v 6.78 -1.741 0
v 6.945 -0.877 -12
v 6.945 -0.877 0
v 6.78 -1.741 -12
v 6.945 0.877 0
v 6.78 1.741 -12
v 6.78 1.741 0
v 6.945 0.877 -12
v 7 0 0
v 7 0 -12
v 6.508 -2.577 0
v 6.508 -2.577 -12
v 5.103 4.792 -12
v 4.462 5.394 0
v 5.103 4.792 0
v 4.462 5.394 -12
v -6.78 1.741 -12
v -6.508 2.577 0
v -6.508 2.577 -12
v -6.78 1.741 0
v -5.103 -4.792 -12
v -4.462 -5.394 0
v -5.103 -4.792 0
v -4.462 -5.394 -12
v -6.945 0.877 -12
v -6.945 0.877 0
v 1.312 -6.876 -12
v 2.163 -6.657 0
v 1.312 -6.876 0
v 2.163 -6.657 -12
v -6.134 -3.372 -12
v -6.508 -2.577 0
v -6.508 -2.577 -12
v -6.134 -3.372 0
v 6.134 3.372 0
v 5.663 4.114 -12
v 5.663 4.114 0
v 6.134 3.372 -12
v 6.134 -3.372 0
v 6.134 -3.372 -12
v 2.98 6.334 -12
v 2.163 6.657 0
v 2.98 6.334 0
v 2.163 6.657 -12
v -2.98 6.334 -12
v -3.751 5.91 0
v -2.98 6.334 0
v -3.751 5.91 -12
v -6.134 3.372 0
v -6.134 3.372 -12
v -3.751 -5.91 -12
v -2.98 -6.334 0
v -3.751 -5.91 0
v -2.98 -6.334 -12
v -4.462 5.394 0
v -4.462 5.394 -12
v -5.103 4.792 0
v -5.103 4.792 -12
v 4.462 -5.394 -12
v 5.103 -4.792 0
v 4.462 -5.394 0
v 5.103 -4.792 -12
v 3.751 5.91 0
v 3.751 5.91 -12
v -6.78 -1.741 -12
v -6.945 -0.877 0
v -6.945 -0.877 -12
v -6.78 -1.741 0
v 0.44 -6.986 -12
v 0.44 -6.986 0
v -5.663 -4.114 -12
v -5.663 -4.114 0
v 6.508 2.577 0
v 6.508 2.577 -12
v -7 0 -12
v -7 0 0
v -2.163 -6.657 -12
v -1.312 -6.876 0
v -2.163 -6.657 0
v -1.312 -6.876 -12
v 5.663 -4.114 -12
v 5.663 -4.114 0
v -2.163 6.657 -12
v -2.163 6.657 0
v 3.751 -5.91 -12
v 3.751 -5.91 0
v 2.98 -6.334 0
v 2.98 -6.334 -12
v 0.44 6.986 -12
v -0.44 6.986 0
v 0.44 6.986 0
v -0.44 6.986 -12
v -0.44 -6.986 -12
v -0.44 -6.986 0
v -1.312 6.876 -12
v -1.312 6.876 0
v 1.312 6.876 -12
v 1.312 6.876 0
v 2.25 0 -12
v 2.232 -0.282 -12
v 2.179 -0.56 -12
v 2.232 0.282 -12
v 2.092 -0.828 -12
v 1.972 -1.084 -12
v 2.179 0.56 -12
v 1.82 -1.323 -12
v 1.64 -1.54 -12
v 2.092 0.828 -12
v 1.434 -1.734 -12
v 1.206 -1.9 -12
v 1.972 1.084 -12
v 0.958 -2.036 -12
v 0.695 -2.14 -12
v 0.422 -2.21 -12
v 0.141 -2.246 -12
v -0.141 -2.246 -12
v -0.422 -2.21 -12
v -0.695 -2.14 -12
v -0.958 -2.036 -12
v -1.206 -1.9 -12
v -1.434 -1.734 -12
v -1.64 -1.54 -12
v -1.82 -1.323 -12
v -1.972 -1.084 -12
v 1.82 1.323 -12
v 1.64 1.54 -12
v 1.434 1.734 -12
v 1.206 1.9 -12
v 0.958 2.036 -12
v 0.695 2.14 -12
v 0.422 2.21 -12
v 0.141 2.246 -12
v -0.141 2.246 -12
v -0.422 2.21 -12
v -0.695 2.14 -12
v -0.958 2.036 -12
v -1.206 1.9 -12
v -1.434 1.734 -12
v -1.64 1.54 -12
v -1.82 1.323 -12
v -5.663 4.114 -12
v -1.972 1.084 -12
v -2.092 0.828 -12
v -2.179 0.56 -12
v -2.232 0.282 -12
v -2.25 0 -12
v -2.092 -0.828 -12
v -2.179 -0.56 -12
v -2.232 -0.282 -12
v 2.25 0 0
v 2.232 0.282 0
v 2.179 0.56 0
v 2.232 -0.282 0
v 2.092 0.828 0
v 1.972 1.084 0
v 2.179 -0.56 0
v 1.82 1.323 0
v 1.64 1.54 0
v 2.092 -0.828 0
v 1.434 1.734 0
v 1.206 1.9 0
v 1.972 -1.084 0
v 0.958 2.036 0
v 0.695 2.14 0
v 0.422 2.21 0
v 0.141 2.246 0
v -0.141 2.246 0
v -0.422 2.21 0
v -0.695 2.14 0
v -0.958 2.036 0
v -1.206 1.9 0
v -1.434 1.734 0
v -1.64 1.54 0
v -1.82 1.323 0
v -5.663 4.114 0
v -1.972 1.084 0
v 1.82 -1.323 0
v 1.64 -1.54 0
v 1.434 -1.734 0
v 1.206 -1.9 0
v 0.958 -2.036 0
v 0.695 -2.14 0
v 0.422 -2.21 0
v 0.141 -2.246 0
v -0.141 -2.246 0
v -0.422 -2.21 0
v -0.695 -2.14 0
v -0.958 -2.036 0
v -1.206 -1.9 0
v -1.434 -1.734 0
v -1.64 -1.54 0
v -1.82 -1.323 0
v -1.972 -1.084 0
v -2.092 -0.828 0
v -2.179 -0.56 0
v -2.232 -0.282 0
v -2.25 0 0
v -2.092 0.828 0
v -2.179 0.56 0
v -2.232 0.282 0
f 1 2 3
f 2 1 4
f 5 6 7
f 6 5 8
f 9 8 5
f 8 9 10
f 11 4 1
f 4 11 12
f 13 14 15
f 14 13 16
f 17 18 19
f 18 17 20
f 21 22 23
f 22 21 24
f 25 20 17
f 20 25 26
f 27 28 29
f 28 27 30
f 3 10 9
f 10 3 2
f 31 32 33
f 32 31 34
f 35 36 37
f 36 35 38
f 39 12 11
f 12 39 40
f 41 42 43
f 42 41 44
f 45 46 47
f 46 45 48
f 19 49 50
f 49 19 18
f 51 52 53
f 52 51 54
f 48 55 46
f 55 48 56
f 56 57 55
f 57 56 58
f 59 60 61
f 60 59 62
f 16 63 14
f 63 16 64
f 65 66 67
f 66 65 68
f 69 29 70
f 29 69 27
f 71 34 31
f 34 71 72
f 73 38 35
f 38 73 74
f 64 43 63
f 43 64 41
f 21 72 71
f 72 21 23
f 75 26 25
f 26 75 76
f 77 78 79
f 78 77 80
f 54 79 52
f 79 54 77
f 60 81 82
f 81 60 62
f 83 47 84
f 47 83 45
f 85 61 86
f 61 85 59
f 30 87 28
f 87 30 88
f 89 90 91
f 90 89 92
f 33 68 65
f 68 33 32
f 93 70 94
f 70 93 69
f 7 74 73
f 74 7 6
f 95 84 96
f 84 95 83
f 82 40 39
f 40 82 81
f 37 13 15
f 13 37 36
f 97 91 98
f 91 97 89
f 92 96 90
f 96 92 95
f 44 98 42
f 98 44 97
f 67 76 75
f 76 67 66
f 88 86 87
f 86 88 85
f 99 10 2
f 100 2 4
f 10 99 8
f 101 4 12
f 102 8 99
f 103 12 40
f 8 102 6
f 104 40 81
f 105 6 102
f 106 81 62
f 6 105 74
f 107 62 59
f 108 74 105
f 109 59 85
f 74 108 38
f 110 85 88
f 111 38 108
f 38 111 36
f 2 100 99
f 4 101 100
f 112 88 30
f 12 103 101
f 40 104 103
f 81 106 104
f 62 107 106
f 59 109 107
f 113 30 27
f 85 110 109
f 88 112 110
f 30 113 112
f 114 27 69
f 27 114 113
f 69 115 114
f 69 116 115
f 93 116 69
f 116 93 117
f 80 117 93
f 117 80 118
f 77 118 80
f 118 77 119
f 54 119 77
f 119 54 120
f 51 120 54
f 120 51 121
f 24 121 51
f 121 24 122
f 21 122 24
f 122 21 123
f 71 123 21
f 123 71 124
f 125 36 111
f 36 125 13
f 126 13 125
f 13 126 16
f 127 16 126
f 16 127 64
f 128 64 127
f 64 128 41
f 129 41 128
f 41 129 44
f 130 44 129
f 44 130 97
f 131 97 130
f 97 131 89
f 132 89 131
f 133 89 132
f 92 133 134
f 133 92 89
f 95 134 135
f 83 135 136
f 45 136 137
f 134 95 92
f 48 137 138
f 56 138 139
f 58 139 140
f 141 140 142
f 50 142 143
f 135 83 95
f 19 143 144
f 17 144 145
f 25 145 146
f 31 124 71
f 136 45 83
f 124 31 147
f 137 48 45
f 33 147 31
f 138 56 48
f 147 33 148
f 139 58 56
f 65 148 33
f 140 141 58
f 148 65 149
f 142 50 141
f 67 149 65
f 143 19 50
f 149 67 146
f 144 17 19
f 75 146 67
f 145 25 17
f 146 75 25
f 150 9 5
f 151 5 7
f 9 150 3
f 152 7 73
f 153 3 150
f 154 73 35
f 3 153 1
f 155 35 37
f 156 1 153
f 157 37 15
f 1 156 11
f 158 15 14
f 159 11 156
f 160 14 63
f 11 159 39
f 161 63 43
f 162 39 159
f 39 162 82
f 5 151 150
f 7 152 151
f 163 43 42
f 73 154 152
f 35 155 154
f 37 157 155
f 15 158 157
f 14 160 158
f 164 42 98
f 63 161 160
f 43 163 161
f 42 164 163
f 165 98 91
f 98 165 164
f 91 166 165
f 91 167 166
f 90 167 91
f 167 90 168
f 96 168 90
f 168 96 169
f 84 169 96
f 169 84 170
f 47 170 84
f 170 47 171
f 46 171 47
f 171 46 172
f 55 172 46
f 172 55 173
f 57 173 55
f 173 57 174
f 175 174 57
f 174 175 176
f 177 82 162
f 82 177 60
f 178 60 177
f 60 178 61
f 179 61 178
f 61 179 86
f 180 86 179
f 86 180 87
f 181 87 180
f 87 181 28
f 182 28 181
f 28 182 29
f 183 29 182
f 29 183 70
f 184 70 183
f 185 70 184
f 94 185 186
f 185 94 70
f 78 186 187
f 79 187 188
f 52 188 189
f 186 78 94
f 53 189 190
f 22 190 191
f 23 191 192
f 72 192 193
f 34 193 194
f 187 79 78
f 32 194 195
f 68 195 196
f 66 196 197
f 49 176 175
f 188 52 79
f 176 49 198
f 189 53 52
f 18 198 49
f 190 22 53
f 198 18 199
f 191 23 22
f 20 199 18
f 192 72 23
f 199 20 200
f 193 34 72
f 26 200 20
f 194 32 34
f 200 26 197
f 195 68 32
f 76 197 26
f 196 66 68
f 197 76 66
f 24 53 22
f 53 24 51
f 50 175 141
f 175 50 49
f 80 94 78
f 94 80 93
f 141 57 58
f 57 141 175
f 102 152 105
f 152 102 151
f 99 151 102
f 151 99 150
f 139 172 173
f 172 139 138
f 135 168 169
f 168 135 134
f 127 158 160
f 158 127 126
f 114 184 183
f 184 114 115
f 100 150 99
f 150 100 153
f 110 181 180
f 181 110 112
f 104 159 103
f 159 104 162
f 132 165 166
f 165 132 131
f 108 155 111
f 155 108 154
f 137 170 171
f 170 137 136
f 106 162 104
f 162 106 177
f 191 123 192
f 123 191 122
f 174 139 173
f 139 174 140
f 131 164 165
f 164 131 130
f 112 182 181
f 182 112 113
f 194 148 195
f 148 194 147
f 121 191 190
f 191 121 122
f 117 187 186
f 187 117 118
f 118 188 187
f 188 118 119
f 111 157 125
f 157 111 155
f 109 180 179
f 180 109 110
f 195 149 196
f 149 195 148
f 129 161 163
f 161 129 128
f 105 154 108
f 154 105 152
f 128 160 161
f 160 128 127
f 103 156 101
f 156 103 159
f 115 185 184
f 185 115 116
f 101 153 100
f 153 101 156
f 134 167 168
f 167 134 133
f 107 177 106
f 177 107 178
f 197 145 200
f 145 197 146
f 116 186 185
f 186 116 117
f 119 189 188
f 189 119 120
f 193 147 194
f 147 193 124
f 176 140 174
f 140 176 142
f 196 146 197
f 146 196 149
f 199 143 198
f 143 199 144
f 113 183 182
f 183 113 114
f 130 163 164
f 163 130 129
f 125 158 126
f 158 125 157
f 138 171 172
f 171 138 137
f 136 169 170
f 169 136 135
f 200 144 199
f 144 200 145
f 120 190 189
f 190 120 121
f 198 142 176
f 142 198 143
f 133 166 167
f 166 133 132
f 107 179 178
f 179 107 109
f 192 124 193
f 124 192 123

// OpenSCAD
$fn = 50;


difference() {
	union() {
		translate(v = [0, 0, -12.0000000000]) {
			cylinder(h = 12, r = 7.0000000000);
		}
		cylinder(h = 0, r = 17.0000000000);
	}
	union() {
		#translate(v = [0, 0, -12]) {
			cylinder(h = 12, r = 2.2500000000);
		}
	}
}
